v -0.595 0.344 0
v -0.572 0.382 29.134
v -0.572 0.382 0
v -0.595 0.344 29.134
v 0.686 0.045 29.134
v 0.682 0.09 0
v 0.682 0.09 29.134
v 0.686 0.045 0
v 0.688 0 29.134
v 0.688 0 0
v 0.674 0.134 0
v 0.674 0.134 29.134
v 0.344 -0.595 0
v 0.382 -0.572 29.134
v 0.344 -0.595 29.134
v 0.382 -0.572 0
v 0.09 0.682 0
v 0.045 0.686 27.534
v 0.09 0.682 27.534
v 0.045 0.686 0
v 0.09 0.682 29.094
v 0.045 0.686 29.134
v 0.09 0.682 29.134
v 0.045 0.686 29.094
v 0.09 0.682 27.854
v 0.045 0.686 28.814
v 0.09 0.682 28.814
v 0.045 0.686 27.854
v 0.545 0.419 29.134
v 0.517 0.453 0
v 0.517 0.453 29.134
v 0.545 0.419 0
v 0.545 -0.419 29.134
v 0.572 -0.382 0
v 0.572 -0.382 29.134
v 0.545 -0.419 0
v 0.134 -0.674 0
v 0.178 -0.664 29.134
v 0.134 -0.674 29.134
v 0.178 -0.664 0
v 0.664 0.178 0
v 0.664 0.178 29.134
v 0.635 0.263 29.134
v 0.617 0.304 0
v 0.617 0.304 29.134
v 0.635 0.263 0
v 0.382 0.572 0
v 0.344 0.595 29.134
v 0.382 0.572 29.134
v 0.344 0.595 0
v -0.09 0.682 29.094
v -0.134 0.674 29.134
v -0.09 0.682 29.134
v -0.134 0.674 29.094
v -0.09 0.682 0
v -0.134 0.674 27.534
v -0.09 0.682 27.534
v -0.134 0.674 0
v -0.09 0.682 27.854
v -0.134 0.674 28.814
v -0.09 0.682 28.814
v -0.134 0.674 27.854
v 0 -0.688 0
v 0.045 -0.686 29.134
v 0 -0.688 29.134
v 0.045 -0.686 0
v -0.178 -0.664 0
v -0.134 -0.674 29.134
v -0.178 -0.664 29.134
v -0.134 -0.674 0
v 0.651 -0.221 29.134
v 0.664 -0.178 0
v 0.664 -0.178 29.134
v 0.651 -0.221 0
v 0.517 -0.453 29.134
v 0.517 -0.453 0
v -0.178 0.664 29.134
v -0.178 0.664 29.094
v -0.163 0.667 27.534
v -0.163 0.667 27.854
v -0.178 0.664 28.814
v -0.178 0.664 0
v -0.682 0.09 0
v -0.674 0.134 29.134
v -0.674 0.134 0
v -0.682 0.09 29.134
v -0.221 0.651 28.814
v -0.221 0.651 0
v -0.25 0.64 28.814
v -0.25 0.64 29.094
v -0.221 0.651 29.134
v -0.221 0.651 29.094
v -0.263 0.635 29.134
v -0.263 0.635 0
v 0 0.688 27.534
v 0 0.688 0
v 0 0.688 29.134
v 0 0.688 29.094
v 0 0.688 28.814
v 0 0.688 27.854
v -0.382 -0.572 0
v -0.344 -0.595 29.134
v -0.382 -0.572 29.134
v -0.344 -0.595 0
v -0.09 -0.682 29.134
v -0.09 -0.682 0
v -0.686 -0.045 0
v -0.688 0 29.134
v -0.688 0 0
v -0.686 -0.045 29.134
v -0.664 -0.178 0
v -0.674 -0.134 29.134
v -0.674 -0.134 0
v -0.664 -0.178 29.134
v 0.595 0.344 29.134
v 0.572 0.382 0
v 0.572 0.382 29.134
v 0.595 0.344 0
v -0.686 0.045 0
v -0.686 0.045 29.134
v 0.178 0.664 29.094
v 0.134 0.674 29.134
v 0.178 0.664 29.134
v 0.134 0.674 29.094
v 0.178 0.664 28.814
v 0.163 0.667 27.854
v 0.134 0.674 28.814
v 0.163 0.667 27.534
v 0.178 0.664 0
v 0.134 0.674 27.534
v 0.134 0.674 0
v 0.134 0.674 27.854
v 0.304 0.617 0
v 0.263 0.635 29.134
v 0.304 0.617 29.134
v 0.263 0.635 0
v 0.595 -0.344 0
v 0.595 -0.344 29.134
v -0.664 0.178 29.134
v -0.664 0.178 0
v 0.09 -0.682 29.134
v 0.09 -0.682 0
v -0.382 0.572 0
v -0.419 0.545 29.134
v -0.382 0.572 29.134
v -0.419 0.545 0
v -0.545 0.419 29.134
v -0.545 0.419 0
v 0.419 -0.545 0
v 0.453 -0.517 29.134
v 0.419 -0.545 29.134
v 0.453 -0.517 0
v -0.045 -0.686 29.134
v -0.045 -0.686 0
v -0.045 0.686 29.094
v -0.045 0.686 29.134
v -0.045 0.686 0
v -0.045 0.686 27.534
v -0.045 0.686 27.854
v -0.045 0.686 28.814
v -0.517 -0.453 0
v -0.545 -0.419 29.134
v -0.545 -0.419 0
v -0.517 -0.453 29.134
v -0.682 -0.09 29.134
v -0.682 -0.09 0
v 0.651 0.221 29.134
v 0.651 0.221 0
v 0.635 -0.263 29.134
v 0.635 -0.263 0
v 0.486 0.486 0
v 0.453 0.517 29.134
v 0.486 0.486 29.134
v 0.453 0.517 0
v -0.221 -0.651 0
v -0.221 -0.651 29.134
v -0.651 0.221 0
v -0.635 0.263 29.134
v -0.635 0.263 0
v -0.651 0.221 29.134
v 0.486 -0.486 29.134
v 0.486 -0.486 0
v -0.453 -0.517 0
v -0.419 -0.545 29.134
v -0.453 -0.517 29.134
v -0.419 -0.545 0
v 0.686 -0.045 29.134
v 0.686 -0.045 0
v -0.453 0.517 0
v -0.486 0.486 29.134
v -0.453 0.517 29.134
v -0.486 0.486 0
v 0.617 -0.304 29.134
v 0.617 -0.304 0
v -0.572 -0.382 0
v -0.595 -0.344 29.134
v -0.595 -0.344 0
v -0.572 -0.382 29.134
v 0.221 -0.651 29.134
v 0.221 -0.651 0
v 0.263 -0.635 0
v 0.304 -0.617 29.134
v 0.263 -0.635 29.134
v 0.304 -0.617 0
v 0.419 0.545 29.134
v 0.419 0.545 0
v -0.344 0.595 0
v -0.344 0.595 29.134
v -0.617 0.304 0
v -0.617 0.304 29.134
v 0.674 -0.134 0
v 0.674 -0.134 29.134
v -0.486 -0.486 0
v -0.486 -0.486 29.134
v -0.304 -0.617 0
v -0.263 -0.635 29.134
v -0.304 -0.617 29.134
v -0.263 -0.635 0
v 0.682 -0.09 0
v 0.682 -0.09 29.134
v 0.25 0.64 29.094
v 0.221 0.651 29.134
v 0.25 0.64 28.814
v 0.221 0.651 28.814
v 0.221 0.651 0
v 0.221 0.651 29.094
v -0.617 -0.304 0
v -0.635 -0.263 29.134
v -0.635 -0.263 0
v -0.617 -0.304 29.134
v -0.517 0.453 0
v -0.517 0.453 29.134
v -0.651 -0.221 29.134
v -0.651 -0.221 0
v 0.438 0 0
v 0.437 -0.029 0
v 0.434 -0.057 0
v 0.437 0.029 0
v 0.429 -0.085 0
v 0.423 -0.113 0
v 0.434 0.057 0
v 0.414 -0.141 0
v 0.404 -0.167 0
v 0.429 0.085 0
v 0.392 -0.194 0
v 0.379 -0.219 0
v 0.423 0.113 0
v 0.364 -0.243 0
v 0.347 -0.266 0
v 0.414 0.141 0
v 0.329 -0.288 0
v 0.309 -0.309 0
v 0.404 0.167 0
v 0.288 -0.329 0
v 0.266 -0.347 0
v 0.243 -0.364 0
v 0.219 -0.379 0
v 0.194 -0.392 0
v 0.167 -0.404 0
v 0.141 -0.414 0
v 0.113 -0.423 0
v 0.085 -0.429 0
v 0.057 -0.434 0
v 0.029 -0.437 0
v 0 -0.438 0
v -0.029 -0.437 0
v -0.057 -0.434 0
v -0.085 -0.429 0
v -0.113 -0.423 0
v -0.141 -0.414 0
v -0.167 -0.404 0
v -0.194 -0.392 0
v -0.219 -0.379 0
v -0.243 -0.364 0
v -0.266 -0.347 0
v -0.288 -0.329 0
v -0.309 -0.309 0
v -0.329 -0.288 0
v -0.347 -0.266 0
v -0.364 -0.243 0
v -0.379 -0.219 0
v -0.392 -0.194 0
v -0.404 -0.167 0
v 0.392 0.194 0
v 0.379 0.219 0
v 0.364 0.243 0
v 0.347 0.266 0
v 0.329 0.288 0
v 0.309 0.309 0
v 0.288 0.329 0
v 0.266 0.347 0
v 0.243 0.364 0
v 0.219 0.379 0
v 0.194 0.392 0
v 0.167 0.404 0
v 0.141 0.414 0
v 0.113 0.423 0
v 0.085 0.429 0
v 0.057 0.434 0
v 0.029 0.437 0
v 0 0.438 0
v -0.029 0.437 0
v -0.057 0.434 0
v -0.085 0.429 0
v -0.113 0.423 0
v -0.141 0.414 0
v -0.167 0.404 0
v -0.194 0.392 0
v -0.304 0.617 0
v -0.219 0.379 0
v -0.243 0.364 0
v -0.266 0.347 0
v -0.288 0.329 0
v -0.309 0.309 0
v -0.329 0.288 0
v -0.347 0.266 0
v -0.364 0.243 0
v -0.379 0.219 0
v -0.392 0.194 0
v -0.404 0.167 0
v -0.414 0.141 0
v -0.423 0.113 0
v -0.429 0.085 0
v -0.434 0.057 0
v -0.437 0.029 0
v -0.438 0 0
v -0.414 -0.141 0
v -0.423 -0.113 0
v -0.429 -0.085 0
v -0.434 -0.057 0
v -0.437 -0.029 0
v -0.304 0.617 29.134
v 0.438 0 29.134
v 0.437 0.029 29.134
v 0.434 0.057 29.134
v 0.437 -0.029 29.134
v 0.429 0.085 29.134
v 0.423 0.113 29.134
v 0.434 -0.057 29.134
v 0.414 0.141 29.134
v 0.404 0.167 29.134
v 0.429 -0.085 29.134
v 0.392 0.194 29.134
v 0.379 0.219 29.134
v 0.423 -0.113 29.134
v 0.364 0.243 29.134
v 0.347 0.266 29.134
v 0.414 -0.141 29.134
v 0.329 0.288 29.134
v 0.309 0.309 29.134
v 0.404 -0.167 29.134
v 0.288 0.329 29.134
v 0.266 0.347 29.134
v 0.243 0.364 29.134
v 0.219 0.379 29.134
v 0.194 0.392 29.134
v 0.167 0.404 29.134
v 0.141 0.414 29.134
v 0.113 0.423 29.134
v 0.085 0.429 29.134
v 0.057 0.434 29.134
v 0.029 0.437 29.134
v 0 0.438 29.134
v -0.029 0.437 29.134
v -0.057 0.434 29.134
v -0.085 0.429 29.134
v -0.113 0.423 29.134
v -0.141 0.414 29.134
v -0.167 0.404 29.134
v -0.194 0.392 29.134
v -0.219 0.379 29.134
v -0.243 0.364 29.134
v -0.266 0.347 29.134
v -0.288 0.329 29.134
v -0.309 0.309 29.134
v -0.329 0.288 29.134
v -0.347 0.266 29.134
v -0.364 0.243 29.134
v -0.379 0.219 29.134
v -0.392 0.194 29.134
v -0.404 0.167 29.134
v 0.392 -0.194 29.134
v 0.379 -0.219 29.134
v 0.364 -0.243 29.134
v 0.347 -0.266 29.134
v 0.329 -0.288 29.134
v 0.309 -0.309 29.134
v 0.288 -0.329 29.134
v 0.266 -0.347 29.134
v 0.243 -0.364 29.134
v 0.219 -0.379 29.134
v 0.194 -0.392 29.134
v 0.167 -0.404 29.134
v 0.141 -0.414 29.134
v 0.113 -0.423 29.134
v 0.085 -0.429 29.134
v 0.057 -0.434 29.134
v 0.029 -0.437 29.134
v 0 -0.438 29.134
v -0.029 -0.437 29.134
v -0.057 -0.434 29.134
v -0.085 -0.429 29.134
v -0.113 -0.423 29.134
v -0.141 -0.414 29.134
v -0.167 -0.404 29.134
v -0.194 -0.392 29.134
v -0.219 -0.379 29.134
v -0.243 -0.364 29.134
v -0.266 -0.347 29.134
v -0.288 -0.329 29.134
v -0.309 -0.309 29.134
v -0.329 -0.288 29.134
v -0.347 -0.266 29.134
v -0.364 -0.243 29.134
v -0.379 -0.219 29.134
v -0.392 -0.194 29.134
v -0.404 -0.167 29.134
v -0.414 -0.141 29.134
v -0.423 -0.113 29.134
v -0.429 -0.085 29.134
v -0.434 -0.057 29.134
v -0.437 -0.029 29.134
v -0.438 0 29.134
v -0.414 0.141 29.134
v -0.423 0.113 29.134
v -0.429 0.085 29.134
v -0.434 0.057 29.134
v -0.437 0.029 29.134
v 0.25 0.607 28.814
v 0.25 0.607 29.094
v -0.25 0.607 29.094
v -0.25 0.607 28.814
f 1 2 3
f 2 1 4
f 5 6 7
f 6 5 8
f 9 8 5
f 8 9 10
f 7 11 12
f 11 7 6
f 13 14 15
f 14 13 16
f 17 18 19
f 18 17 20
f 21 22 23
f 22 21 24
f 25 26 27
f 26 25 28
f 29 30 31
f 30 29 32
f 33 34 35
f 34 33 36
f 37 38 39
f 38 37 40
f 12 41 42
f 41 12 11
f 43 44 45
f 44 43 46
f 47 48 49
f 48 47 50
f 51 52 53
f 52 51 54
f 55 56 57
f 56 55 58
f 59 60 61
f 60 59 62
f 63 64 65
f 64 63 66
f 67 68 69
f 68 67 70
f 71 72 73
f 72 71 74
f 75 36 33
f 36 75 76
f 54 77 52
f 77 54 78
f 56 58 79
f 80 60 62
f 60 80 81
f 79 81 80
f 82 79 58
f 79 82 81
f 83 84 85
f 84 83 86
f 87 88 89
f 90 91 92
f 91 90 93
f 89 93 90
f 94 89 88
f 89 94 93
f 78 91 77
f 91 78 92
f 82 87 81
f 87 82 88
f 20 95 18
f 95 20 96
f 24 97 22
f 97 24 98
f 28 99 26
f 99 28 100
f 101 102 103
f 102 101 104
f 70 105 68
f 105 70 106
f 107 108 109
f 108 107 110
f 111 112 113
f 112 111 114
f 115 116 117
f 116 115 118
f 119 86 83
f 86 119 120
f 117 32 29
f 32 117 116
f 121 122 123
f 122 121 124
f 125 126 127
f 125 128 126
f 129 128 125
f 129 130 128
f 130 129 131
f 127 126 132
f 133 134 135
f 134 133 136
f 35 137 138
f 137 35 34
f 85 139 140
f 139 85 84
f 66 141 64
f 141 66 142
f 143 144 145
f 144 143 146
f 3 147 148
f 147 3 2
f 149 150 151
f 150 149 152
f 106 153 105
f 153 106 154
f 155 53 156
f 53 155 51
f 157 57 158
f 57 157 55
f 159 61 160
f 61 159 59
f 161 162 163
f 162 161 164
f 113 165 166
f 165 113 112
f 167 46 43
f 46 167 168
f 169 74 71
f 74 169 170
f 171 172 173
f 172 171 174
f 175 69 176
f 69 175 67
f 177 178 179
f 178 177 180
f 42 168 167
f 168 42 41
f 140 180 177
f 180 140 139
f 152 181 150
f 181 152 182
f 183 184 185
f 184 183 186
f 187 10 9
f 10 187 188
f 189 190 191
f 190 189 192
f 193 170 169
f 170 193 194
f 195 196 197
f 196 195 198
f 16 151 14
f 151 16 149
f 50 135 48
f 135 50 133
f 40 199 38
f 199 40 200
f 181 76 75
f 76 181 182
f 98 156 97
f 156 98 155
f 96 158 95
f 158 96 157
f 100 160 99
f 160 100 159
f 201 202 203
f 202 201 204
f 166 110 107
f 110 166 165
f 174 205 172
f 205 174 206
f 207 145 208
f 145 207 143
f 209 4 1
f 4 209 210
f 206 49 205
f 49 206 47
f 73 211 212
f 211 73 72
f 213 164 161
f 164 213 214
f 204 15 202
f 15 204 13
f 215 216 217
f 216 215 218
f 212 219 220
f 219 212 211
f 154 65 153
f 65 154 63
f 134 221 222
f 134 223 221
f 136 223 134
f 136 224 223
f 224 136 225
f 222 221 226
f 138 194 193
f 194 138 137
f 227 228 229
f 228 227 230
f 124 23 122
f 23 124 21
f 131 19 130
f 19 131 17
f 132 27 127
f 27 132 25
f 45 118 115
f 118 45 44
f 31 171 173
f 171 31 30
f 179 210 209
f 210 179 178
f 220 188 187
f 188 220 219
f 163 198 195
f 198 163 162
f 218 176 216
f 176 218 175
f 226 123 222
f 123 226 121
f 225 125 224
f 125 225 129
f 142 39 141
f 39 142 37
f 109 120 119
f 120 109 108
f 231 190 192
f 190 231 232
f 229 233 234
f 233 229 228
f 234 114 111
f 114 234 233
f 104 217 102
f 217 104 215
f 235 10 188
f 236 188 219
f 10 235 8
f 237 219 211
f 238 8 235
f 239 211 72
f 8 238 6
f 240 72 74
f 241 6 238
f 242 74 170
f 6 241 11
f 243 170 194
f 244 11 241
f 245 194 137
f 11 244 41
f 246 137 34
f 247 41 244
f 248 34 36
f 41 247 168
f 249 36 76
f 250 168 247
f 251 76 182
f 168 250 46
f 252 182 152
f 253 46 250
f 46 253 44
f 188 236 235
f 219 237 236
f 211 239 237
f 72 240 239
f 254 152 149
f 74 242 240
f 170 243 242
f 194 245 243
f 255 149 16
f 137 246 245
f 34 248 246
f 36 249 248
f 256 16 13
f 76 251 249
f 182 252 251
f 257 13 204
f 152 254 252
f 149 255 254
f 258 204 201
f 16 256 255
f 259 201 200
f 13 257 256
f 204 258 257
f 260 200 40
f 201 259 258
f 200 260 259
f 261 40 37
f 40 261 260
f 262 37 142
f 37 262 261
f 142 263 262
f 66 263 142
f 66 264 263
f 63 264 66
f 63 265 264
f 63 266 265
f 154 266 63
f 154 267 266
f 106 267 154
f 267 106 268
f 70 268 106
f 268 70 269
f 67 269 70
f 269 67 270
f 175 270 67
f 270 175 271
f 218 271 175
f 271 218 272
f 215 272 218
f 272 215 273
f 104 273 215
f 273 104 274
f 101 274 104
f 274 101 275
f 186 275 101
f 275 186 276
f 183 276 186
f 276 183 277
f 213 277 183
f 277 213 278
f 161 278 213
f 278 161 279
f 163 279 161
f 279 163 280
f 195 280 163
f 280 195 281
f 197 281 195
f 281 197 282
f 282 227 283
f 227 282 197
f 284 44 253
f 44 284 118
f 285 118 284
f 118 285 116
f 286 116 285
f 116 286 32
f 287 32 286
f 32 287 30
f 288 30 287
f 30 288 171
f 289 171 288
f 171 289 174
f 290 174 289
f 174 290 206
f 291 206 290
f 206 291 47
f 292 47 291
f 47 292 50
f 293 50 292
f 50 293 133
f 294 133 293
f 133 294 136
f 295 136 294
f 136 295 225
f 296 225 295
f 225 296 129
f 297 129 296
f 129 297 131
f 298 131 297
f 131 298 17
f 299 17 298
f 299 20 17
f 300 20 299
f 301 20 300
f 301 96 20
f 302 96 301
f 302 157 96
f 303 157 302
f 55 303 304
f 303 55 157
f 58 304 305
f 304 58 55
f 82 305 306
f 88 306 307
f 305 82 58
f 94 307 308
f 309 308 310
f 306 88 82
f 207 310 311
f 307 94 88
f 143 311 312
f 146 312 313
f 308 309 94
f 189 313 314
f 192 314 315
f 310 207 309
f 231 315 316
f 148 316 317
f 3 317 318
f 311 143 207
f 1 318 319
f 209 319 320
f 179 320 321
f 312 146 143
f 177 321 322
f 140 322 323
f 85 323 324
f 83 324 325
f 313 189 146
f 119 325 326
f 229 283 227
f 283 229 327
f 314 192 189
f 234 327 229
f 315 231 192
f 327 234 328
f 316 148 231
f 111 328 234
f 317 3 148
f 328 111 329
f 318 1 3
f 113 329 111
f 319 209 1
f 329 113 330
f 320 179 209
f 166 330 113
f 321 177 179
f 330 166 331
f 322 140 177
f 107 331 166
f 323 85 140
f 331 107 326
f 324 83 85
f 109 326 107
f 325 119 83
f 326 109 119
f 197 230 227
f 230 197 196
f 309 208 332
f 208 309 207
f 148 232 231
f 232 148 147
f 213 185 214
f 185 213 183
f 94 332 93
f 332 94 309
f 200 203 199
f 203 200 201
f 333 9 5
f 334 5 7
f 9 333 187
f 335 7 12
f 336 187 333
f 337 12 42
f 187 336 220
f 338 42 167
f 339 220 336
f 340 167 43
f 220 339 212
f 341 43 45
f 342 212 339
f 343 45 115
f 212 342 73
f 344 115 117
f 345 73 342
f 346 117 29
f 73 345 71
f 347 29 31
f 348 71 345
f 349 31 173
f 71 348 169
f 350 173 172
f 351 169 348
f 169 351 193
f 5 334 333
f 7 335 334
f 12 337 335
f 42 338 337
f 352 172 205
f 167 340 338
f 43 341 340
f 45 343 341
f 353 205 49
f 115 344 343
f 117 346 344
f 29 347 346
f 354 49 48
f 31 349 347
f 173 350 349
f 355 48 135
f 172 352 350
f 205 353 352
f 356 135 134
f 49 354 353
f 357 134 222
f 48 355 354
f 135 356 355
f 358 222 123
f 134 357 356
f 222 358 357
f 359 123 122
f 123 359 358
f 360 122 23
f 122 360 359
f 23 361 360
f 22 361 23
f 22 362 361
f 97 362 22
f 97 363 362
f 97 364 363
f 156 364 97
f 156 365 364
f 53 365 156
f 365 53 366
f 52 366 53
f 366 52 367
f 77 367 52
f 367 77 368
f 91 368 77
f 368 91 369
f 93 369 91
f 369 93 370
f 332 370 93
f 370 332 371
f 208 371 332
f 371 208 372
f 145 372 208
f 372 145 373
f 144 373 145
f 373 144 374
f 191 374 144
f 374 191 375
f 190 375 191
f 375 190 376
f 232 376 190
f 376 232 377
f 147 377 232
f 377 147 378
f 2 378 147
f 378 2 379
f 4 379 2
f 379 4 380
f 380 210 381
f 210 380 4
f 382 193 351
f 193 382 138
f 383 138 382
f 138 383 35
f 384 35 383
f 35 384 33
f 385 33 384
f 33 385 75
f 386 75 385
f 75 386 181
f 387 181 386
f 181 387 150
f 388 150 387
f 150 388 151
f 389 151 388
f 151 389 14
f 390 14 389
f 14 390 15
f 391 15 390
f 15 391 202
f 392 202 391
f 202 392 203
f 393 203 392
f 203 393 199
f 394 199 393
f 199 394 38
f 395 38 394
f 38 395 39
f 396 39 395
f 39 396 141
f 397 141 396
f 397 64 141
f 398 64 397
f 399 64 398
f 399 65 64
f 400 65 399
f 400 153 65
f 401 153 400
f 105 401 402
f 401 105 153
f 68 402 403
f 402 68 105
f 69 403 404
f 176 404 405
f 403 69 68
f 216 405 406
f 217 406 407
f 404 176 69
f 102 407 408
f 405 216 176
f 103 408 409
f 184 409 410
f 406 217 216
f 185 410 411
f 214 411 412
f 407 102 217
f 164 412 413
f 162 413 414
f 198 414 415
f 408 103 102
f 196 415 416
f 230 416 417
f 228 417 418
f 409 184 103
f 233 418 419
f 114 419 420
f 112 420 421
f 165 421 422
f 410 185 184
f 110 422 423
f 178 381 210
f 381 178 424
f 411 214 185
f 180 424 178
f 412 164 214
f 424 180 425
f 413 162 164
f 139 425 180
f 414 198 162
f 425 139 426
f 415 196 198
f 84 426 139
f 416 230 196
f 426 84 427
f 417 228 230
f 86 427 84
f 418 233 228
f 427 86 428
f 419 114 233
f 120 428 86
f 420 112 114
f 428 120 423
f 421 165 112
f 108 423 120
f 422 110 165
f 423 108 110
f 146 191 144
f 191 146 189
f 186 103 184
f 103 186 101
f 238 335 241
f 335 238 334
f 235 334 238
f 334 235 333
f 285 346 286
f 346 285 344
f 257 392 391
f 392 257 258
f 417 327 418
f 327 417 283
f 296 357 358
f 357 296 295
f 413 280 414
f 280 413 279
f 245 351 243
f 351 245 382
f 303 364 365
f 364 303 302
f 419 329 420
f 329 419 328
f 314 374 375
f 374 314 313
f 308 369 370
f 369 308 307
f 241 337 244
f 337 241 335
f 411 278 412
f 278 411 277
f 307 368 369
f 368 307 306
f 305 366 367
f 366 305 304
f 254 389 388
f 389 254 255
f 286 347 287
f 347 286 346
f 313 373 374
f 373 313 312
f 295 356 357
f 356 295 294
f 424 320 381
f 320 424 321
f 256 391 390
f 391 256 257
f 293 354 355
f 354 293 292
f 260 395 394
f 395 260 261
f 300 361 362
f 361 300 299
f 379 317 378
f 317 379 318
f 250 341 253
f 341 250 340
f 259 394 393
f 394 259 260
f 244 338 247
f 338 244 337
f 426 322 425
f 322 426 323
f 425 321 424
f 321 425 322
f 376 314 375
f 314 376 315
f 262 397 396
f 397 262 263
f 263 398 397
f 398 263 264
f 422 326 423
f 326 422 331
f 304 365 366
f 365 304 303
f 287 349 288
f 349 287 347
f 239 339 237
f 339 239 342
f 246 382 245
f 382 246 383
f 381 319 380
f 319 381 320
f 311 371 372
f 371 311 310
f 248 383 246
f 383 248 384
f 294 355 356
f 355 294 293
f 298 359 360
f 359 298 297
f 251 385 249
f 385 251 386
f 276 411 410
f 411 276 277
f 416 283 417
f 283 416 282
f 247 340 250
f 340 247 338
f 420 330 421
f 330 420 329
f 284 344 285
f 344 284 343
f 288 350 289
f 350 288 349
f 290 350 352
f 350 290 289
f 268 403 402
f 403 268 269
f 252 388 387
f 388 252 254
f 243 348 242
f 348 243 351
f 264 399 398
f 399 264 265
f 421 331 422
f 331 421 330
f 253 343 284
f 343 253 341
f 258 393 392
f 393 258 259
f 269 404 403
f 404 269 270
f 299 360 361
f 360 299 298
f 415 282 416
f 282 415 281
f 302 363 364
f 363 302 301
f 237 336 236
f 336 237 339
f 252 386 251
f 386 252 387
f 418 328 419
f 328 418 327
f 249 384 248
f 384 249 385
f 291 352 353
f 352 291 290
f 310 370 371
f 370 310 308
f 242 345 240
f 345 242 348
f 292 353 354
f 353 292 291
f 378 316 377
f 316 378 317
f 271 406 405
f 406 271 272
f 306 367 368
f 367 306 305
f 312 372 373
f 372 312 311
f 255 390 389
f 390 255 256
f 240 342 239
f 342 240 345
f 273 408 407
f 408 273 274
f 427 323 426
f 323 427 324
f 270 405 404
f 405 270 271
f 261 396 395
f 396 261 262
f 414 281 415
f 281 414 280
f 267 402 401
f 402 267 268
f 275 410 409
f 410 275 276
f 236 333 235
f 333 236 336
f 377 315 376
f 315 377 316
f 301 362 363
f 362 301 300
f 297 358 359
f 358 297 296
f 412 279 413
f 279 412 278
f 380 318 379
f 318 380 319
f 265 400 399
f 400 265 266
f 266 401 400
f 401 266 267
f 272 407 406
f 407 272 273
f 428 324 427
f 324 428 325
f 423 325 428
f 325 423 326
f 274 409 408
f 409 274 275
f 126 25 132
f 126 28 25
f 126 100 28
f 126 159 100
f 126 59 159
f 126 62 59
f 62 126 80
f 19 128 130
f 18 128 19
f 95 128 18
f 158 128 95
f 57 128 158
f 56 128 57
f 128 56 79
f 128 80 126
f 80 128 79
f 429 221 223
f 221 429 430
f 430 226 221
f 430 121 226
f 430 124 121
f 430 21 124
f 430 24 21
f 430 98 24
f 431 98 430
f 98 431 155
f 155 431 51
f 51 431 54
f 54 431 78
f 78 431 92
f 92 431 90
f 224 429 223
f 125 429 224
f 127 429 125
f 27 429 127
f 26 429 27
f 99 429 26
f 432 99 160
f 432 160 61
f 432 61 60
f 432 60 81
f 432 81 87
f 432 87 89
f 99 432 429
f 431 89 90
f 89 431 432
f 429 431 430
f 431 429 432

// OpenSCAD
// Kaval + Alghosazi fipple flute starter, units = inches.
$fn = 96;

member = "KAV-A3-5H";
total_length = 29.134;
bore_id = 0.875;
body_od = 1.375;
top_to_window = 1.60;
windway_h = 0.038;
windway_w = 0.500;
window_l = 0.320;
window_w = 0.500;

module body_blank() {
  difference() {
    cylinder(h = total_length, d = body_od);
    translate([0,0,-0.02]) cylinder(h = total_length + 0.04, d = bore_id);
  }
}

module true_sound_window() {
  translate([-window_w/2, body_od/2 - 0.02, total_length - top_to_window])
    cube([window_w, 0.12, window_l], center=false);
}

module end_mouth_inlet() {
  translate([-windway_w/2, body_od/2 - 0.08, total_length - 0.32])
    cube([windway_w, 0.18, 0.28], center=false);
}

module flute_body_preview() {
  difference() {
    body_blank();
    true_sound_window();
    end_mouth_inlet();
  }
}

flute_body_preview();
